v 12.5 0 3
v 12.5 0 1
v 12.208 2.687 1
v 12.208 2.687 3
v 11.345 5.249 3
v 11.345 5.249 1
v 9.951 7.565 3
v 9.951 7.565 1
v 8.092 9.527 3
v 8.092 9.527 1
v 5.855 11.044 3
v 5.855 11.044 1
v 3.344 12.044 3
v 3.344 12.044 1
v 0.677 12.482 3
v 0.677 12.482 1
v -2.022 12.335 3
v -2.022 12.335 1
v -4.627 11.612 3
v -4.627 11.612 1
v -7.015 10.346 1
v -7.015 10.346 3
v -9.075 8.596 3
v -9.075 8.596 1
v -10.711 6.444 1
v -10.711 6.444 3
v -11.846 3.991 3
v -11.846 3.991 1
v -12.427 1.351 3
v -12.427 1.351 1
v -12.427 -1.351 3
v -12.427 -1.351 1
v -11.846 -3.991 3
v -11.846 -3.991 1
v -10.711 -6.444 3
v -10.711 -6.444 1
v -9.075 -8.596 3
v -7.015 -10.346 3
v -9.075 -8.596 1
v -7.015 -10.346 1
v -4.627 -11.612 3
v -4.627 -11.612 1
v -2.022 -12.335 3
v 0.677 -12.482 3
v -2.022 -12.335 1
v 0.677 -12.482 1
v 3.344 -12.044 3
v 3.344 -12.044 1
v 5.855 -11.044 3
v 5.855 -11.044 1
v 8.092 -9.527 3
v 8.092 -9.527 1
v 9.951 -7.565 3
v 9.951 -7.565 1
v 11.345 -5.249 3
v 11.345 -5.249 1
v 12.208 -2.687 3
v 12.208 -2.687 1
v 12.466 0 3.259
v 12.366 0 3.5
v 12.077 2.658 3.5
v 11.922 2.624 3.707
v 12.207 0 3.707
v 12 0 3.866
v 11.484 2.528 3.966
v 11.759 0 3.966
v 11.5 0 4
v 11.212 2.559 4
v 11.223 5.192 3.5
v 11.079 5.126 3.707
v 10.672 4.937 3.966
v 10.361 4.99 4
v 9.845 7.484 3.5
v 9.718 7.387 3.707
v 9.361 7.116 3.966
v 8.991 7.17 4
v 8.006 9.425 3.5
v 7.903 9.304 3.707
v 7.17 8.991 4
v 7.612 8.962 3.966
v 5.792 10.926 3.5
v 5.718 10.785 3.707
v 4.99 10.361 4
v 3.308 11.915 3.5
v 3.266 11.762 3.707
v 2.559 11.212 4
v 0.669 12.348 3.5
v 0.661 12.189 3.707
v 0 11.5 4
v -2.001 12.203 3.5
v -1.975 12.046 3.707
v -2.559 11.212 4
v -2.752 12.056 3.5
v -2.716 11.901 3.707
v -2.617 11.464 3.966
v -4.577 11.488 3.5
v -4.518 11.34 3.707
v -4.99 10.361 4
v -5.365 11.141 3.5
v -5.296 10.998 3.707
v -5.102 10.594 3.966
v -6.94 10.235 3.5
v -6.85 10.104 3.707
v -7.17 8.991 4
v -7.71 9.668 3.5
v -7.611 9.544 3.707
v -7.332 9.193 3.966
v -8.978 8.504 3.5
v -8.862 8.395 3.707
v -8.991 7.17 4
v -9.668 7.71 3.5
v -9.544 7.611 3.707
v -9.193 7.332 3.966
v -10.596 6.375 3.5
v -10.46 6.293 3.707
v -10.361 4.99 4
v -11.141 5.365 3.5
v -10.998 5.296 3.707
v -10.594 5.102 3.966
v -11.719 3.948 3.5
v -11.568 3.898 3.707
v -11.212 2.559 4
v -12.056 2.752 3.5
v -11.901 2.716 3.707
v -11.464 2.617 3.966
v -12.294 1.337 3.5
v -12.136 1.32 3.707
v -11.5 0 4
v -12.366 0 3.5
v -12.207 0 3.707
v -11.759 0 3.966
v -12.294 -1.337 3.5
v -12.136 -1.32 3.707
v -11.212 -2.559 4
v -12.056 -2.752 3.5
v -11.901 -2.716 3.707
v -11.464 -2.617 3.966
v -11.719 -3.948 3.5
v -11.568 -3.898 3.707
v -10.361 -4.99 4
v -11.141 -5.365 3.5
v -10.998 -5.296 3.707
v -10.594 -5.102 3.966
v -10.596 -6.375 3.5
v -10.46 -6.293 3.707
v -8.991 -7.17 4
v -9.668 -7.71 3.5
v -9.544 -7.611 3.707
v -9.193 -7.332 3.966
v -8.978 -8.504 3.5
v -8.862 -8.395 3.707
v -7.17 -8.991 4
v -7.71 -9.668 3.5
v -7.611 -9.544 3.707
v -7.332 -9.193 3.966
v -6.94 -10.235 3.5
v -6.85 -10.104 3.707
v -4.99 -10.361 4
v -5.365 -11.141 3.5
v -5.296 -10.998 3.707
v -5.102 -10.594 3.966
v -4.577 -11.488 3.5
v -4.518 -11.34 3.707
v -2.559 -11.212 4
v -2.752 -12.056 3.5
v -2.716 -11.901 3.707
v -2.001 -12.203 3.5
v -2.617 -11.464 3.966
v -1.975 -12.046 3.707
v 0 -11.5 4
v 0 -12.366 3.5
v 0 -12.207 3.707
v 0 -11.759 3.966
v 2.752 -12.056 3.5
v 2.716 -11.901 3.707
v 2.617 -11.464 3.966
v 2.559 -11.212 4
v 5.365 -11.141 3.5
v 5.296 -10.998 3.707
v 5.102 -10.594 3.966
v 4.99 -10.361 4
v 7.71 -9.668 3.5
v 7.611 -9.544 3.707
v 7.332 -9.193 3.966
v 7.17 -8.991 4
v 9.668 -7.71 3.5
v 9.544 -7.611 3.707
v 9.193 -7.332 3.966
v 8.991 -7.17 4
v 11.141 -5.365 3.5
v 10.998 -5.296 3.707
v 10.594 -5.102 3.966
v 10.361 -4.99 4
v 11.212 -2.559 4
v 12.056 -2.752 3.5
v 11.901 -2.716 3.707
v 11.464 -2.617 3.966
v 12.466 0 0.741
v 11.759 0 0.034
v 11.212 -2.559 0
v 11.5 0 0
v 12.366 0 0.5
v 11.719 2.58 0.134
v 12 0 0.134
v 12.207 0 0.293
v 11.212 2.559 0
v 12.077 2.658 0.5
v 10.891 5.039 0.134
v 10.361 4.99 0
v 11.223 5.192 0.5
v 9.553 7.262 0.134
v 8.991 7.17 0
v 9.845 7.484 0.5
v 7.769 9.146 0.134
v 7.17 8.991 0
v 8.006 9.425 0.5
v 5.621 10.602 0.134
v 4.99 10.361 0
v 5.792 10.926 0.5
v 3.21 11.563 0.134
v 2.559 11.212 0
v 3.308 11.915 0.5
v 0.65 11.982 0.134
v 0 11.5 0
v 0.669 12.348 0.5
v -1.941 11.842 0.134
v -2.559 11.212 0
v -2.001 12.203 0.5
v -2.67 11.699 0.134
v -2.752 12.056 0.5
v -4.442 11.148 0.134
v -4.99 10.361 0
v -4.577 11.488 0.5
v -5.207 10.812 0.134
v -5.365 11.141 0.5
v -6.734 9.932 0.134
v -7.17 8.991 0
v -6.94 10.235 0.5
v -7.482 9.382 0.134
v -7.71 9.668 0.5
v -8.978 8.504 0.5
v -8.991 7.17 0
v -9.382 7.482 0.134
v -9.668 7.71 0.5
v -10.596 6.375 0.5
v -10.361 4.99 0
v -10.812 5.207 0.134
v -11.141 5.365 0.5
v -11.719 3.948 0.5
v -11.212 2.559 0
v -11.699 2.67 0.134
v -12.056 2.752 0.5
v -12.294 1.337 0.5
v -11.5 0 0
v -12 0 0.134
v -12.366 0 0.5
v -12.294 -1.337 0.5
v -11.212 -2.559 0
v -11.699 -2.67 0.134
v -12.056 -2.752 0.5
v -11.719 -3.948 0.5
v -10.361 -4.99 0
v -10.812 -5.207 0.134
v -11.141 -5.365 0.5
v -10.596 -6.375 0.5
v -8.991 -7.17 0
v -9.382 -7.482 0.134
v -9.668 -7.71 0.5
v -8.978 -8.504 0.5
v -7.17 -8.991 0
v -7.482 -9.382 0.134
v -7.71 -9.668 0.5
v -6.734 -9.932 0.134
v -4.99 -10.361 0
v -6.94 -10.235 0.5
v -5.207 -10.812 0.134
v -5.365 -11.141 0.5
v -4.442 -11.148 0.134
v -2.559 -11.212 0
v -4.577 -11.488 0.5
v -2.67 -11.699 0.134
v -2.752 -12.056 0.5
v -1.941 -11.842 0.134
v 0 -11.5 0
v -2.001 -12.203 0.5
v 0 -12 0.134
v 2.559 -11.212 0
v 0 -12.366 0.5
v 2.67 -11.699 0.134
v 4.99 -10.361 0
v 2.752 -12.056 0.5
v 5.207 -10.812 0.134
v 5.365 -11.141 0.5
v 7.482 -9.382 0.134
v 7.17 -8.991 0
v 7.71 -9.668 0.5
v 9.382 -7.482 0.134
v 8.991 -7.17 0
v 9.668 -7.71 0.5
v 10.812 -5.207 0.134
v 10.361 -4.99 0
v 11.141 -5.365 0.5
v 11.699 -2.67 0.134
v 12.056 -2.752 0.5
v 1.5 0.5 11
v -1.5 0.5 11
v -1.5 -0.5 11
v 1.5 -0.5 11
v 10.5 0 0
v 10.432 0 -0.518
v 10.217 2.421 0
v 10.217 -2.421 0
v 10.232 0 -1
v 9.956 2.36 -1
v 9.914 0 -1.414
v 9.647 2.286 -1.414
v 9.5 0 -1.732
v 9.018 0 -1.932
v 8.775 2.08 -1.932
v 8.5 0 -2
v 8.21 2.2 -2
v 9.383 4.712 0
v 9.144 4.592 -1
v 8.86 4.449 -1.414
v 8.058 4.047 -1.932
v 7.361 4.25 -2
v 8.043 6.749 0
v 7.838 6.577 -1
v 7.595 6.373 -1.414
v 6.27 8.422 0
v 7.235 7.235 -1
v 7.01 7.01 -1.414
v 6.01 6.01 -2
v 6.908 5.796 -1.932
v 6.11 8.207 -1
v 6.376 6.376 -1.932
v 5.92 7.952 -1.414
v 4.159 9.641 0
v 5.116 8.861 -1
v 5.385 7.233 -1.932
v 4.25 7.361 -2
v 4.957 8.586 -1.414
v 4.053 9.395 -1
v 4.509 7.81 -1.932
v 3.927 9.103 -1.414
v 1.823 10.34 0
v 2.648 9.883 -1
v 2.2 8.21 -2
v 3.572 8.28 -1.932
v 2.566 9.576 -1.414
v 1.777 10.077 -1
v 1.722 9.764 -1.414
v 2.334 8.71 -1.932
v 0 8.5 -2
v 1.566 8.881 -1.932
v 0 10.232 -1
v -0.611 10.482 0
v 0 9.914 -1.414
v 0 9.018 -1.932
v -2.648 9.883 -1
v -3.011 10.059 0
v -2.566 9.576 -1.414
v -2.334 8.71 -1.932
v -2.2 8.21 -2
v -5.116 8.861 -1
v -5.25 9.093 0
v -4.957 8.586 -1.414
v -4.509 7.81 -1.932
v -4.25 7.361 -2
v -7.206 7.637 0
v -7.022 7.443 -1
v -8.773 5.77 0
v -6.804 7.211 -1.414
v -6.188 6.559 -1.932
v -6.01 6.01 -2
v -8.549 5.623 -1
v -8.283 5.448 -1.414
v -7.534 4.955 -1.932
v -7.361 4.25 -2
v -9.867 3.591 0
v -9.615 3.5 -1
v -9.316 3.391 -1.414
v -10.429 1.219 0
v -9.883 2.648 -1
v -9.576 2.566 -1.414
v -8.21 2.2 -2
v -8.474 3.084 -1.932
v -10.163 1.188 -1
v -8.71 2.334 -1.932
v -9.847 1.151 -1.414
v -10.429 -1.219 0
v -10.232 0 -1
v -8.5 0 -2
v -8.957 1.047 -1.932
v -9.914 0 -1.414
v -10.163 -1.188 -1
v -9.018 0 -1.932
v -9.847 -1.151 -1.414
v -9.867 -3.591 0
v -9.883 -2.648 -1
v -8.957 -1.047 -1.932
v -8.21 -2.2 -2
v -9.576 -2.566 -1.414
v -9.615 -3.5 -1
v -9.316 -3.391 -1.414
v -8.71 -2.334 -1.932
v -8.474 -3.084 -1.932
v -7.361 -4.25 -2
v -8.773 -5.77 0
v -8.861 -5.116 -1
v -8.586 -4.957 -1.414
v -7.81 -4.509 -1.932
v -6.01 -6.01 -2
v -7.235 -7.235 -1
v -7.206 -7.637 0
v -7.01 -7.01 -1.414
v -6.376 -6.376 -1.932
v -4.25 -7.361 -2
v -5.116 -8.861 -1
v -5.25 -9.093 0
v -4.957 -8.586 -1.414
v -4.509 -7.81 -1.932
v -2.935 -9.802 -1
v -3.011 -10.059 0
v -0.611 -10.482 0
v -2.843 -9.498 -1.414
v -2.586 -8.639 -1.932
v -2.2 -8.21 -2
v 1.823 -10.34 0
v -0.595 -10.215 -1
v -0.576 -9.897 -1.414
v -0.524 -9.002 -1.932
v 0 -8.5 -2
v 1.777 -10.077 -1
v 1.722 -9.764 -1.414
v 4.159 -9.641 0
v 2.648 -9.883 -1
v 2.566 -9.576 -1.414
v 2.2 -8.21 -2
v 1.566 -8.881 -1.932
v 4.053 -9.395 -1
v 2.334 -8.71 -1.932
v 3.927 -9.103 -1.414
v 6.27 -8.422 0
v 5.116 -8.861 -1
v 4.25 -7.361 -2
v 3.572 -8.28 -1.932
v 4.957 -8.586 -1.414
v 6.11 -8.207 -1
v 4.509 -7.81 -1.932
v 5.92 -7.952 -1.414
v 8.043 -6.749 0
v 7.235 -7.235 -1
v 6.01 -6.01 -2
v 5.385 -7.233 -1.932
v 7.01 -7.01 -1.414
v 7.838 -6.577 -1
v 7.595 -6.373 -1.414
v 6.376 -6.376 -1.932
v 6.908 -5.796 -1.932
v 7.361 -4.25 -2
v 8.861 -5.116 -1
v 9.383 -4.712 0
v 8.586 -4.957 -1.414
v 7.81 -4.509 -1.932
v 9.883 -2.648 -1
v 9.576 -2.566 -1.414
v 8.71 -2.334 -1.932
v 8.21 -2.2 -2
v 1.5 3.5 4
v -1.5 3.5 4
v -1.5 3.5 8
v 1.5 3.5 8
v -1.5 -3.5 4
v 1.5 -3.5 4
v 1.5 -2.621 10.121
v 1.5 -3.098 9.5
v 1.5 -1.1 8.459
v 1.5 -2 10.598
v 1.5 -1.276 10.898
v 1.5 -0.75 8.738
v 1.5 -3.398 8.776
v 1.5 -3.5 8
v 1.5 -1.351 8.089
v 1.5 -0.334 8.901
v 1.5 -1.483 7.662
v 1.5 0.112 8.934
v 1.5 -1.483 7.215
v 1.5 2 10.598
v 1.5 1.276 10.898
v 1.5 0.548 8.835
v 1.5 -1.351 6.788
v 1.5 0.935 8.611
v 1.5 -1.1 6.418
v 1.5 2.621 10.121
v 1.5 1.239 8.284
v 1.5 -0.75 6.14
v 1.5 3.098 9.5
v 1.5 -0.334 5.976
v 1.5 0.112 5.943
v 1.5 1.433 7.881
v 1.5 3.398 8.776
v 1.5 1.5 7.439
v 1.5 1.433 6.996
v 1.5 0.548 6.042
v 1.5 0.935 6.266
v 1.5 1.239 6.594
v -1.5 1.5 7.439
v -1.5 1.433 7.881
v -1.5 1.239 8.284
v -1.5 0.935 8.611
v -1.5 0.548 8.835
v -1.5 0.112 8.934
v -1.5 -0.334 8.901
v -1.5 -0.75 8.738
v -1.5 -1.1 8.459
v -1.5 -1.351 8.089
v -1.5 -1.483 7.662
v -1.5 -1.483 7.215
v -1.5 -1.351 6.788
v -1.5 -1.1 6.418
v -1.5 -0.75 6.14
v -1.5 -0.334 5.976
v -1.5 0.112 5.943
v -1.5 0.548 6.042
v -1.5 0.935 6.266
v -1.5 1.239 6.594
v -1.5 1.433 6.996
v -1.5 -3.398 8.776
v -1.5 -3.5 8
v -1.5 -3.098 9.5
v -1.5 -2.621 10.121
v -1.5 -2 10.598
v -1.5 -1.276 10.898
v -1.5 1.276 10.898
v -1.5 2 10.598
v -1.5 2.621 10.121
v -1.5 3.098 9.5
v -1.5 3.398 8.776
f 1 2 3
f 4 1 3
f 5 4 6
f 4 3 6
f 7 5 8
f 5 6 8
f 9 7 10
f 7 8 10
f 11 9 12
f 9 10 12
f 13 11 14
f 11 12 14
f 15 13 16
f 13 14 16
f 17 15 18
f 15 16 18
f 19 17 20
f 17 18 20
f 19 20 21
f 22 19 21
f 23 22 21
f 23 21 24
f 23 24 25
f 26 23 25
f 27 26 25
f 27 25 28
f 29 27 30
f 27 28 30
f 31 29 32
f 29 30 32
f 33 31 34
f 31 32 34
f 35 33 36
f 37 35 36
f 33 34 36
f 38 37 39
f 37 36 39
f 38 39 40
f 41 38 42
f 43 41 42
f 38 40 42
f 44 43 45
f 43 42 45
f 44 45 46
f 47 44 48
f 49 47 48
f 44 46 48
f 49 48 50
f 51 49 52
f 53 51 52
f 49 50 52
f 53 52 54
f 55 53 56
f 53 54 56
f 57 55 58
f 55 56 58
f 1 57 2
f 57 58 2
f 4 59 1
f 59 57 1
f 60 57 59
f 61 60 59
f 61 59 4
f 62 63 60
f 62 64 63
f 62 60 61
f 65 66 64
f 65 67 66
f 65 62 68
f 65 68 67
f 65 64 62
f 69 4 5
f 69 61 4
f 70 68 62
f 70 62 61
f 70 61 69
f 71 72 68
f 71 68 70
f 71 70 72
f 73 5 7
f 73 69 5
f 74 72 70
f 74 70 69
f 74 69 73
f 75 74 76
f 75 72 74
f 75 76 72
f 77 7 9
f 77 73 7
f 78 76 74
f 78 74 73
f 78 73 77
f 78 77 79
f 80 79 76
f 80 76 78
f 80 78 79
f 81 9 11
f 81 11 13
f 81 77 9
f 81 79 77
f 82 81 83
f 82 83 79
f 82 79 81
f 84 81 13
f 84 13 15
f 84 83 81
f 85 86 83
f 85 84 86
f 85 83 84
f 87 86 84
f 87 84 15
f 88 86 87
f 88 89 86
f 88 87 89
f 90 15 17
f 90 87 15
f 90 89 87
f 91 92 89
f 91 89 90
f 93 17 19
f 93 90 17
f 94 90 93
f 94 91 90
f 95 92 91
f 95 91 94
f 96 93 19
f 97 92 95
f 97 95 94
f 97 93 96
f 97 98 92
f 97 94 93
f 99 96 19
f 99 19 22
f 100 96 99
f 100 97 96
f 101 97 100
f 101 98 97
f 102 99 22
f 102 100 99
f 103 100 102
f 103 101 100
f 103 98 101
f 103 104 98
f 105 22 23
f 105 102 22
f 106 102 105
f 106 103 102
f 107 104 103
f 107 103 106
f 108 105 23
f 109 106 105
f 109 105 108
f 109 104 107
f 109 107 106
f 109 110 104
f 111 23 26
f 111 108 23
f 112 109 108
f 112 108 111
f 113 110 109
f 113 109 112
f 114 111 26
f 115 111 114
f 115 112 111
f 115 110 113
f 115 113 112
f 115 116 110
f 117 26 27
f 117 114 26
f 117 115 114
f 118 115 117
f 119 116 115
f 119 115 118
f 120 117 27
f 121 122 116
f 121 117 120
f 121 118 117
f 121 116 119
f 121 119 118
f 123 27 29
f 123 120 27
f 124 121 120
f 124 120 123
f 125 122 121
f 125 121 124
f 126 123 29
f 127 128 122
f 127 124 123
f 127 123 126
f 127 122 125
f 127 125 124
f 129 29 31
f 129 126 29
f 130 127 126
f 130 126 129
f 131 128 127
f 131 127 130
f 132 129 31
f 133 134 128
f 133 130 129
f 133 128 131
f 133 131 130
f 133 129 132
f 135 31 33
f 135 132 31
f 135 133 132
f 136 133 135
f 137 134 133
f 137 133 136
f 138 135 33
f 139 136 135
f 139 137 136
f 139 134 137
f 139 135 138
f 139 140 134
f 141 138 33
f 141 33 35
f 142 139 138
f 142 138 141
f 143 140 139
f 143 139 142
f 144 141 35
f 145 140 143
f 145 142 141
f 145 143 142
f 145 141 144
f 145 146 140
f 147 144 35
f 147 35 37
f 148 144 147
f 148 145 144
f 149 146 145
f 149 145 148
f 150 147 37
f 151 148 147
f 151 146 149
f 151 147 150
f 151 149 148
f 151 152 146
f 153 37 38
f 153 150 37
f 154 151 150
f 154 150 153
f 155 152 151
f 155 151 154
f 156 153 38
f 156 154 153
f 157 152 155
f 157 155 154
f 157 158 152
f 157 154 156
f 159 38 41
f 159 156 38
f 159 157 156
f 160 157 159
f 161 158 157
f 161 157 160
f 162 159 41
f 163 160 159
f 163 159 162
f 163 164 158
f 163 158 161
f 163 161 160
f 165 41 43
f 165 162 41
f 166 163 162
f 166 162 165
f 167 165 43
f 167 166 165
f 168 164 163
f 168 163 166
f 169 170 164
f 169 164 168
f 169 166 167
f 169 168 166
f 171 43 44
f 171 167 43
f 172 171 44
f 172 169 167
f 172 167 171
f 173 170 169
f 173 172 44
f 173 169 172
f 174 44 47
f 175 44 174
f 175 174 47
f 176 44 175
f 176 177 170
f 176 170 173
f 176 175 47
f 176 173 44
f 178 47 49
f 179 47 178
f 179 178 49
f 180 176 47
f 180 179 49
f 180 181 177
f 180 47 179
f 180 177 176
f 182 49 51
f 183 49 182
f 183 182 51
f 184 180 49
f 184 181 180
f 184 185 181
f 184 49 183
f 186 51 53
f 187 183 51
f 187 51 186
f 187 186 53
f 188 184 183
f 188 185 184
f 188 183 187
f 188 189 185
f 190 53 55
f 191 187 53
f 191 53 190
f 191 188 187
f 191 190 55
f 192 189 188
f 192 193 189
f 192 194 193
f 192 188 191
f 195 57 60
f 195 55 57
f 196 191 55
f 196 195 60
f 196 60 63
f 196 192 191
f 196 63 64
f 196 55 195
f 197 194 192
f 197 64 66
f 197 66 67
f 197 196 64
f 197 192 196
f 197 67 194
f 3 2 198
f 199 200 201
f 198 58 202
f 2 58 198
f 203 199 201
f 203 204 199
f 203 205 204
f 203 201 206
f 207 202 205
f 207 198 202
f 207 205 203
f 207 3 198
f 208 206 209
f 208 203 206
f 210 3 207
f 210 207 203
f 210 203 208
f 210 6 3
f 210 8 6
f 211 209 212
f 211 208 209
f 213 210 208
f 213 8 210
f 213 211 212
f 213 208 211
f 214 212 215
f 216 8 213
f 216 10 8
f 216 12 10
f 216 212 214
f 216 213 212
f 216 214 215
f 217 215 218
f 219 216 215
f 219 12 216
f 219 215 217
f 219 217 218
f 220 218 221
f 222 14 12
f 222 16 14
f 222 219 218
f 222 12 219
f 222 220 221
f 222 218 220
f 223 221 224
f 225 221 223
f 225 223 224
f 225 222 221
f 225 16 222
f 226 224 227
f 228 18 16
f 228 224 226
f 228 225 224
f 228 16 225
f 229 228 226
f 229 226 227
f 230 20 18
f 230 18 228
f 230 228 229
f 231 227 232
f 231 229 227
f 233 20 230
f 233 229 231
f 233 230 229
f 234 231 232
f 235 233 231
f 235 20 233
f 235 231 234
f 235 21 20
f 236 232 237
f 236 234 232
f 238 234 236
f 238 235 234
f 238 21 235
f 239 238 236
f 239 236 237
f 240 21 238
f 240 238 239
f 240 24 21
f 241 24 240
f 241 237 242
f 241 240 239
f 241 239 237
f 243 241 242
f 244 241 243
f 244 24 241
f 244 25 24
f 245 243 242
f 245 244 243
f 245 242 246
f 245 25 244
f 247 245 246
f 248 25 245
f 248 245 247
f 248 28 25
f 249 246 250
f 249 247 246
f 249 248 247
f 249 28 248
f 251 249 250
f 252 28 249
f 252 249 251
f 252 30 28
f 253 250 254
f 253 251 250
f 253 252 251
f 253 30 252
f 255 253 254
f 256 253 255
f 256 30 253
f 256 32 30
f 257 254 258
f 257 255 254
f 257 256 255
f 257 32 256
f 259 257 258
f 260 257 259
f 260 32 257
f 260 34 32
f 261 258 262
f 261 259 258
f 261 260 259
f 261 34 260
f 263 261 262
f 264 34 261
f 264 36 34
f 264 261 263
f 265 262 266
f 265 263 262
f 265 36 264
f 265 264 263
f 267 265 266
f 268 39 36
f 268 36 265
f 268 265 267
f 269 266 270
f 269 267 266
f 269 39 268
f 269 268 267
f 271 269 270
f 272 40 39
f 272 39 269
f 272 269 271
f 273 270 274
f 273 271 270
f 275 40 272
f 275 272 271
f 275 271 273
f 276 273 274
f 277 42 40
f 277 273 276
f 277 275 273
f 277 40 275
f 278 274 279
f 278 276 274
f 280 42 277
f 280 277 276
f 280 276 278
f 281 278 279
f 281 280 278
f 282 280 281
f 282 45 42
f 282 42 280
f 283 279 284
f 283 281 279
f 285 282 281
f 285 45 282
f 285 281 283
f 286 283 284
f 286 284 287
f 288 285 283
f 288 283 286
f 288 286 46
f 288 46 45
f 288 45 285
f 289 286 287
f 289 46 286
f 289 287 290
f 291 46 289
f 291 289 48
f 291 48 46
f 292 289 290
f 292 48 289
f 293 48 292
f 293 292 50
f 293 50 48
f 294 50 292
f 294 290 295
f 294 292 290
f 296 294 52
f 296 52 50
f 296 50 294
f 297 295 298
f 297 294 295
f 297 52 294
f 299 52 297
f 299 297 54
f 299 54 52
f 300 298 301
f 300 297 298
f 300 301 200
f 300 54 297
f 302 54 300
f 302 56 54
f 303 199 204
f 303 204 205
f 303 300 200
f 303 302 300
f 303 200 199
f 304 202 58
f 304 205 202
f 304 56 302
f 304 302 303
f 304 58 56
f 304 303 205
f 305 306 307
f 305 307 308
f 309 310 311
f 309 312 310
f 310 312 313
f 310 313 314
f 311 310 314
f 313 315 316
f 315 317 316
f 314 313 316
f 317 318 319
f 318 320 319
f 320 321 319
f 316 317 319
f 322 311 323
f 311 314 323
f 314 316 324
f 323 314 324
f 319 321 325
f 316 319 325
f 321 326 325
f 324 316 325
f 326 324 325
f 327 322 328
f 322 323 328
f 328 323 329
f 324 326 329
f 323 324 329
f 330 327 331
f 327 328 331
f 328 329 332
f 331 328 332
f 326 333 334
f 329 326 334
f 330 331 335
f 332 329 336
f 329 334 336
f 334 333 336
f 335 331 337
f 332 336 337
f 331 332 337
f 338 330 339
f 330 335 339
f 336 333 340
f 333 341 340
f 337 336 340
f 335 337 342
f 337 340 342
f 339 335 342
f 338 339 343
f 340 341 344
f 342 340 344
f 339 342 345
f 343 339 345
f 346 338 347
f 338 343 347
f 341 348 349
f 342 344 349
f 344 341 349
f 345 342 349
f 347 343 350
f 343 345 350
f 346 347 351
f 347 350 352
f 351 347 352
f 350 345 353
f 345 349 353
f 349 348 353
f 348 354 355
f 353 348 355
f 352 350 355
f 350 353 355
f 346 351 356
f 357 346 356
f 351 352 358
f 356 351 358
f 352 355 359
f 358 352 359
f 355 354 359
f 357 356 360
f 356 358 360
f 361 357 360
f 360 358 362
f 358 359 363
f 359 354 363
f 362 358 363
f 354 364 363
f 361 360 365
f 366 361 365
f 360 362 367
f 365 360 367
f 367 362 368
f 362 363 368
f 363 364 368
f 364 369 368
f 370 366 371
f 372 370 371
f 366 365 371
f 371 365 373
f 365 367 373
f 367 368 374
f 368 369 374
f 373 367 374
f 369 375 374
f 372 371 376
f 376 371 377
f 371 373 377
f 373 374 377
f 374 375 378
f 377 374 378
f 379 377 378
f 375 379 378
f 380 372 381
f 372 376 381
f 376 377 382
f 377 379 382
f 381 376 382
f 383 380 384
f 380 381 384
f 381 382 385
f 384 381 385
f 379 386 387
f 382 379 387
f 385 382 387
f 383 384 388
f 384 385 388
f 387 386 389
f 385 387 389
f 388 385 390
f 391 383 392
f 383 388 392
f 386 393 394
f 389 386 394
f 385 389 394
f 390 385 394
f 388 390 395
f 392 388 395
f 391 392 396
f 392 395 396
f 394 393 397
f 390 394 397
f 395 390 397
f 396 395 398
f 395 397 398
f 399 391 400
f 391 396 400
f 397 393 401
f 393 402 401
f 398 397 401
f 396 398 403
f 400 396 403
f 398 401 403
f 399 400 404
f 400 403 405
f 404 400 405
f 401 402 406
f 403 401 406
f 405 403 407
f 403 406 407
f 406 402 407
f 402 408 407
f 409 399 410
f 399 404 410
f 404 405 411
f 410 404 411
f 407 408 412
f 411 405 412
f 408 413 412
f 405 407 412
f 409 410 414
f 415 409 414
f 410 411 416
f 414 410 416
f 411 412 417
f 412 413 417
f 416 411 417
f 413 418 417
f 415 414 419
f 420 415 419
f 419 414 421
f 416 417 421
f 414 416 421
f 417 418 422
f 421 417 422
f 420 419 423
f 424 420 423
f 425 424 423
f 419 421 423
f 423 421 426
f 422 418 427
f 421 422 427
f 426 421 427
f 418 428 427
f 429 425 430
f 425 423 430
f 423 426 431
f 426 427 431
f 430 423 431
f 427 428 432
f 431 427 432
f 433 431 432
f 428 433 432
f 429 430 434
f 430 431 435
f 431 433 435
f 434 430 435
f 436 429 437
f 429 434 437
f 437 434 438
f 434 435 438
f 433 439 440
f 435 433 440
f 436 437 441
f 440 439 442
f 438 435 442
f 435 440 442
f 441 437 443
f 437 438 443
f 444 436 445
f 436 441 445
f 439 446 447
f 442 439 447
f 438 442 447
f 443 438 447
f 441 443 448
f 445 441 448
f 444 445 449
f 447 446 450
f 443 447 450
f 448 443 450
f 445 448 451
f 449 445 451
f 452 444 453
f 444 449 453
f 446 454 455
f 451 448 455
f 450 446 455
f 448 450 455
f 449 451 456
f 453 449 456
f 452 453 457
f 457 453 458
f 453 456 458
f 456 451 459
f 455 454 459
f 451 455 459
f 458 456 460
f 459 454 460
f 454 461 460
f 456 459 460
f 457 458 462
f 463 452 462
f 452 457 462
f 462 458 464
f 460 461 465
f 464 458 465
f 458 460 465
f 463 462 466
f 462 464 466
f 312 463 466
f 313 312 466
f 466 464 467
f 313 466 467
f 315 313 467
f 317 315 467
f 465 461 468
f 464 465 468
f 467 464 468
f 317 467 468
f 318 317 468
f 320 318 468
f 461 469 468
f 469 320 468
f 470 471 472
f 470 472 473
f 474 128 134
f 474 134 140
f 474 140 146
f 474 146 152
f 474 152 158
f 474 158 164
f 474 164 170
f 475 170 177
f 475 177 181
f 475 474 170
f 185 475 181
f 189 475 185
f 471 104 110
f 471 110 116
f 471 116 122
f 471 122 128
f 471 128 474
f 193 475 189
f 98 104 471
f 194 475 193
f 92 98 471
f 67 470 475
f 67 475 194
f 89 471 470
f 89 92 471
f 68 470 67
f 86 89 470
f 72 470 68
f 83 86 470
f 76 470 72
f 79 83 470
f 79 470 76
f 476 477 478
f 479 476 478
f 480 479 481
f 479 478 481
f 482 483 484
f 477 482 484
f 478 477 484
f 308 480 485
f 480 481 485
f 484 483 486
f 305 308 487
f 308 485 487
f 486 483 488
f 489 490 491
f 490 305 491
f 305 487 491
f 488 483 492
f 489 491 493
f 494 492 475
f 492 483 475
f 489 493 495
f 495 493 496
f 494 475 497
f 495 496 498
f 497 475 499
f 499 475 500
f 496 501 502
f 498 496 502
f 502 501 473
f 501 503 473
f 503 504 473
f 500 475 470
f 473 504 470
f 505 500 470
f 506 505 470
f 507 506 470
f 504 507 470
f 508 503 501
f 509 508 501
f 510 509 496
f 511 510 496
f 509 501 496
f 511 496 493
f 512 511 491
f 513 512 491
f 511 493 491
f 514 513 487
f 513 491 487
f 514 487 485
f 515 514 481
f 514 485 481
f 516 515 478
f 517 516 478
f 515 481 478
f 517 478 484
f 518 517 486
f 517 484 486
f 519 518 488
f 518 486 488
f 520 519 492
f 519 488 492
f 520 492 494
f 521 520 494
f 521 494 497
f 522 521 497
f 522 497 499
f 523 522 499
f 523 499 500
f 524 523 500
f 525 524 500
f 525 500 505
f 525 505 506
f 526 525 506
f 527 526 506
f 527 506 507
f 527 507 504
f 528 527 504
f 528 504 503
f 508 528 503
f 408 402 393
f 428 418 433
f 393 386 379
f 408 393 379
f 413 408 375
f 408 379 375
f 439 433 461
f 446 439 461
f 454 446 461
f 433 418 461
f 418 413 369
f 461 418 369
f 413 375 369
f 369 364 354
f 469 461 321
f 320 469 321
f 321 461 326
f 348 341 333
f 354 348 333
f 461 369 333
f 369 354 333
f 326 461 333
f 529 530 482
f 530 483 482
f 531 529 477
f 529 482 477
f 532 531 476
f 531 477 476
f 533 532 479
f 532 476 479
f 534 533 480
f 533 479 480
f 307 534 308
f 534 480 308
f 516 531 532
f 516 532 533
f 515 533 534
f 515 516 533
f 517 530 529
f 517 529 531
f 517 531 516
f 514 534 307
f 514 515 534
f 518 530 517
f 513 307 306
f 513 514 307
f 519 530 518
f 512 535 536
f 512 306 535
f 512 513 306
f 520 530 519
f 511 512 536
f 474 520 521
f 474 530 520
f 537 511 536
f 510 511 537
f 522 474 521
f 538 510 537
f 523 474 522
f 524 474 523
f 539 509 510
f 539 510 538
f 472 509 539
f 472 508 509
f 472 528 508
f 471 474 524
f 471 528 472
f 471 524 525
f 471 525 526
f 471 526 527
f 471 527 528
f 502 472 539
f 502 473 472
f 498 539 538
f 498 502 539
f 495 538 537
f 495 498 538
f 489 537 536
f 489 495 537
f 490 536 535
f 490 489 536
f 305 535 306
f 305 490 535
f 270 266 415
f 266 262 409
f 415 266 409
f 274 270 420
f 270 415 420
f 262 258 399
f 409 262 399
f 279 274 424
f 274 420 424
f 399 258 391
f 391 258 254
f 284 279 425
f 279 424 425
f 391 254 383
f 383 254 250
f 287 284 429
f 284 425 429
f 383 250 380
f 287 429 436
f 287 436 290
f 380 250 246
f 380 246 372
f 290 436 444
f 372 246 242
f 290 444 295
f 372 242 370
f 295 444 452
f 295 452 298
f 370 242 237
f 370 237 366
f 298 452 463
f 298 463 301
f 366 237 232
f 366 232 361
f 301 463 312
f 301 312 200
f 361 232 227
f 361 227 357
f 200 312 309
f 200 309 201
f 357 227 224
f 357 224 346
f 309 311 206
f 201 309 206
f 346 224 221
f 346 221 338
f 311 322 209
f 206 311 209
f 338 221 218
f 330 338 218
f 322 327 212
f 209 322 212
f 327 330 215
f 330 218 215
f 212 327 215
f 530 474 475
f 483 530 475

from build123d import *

# Parameters (mm, degrees)
F0_R     = 10.5
F1_DEPTH = 2
F0_R_2   = 12.5
F2_DEPTH = 4
F3_W     = 3
F3_H     = 7
F4_DEPTH = 7
F6_R     = 3
F5_R     = 1.5
F7_DEPTH = 25
F8_R     = 1.99999
F9_R     = 1


# Not quite as in the source:
# - a fillet or chamfer is up to 0.001 mm smaller than in the source, because OpenCascade refuses the exact size


with BuildPart() as f1:
    # F0 (on Top) → F1 (new body)
    with BuildSketch(Plane.XY):
        Circle(F0_R)
    extrude(amount=-F1_DEPTH)

    # F0 (on Top) → F2 (join)
    with BuildSketch(Plane.XY):
        Circle(F0_R_2)
        Circle(F0_R, mode=Mode.SUBTRACT)
        Circle(F0_R)
    extrude(amount=F2_DEPTH)

    # F3 (on face) → F4 (join)
    with BuildSketch(Plane.XY.offset(4)):
        Rectangle(F3_W, F3_H)
    extrude(amount=F4_DEPTH)

    # F6
    f6_edges = [f1.edges().sort_by_distance(p)[0] for p in [
        (0, -3.5, 11),
        (0, 3.5, 11),
    ]]
    fillet(f6_edges, radius=F6_R)

    # F5 (on face) → F7 (cut)
    with BuildSketch(Plane.YZ.offset(1.5)):
        with Locations((0, 7.438564696)):
            Circle(F5_R)
    extrude(amount=-F7_DEPTH, mode=Mode.SUBTRACT)

    # F8 (radius 2 in the source; OpenCascade refuses exactly that, so slightly less here)
    f8_edges = [f1.edges().sort_by_distance(p)[0] for p in [
        (-10.5, 0, -2),
    ]]
    fillet(f8_edges, radius=F8_R)

    # F9
    f9_edges = [f1.edges().sort_by_distance(p)[0] for p in [
        (12.5, 0, 2),
        (-12.5, 0, 0),
        (-12.5, 0, 4),
    ]]
    fillet(f9_edges, radius=F9_R)


solid = f1.part
